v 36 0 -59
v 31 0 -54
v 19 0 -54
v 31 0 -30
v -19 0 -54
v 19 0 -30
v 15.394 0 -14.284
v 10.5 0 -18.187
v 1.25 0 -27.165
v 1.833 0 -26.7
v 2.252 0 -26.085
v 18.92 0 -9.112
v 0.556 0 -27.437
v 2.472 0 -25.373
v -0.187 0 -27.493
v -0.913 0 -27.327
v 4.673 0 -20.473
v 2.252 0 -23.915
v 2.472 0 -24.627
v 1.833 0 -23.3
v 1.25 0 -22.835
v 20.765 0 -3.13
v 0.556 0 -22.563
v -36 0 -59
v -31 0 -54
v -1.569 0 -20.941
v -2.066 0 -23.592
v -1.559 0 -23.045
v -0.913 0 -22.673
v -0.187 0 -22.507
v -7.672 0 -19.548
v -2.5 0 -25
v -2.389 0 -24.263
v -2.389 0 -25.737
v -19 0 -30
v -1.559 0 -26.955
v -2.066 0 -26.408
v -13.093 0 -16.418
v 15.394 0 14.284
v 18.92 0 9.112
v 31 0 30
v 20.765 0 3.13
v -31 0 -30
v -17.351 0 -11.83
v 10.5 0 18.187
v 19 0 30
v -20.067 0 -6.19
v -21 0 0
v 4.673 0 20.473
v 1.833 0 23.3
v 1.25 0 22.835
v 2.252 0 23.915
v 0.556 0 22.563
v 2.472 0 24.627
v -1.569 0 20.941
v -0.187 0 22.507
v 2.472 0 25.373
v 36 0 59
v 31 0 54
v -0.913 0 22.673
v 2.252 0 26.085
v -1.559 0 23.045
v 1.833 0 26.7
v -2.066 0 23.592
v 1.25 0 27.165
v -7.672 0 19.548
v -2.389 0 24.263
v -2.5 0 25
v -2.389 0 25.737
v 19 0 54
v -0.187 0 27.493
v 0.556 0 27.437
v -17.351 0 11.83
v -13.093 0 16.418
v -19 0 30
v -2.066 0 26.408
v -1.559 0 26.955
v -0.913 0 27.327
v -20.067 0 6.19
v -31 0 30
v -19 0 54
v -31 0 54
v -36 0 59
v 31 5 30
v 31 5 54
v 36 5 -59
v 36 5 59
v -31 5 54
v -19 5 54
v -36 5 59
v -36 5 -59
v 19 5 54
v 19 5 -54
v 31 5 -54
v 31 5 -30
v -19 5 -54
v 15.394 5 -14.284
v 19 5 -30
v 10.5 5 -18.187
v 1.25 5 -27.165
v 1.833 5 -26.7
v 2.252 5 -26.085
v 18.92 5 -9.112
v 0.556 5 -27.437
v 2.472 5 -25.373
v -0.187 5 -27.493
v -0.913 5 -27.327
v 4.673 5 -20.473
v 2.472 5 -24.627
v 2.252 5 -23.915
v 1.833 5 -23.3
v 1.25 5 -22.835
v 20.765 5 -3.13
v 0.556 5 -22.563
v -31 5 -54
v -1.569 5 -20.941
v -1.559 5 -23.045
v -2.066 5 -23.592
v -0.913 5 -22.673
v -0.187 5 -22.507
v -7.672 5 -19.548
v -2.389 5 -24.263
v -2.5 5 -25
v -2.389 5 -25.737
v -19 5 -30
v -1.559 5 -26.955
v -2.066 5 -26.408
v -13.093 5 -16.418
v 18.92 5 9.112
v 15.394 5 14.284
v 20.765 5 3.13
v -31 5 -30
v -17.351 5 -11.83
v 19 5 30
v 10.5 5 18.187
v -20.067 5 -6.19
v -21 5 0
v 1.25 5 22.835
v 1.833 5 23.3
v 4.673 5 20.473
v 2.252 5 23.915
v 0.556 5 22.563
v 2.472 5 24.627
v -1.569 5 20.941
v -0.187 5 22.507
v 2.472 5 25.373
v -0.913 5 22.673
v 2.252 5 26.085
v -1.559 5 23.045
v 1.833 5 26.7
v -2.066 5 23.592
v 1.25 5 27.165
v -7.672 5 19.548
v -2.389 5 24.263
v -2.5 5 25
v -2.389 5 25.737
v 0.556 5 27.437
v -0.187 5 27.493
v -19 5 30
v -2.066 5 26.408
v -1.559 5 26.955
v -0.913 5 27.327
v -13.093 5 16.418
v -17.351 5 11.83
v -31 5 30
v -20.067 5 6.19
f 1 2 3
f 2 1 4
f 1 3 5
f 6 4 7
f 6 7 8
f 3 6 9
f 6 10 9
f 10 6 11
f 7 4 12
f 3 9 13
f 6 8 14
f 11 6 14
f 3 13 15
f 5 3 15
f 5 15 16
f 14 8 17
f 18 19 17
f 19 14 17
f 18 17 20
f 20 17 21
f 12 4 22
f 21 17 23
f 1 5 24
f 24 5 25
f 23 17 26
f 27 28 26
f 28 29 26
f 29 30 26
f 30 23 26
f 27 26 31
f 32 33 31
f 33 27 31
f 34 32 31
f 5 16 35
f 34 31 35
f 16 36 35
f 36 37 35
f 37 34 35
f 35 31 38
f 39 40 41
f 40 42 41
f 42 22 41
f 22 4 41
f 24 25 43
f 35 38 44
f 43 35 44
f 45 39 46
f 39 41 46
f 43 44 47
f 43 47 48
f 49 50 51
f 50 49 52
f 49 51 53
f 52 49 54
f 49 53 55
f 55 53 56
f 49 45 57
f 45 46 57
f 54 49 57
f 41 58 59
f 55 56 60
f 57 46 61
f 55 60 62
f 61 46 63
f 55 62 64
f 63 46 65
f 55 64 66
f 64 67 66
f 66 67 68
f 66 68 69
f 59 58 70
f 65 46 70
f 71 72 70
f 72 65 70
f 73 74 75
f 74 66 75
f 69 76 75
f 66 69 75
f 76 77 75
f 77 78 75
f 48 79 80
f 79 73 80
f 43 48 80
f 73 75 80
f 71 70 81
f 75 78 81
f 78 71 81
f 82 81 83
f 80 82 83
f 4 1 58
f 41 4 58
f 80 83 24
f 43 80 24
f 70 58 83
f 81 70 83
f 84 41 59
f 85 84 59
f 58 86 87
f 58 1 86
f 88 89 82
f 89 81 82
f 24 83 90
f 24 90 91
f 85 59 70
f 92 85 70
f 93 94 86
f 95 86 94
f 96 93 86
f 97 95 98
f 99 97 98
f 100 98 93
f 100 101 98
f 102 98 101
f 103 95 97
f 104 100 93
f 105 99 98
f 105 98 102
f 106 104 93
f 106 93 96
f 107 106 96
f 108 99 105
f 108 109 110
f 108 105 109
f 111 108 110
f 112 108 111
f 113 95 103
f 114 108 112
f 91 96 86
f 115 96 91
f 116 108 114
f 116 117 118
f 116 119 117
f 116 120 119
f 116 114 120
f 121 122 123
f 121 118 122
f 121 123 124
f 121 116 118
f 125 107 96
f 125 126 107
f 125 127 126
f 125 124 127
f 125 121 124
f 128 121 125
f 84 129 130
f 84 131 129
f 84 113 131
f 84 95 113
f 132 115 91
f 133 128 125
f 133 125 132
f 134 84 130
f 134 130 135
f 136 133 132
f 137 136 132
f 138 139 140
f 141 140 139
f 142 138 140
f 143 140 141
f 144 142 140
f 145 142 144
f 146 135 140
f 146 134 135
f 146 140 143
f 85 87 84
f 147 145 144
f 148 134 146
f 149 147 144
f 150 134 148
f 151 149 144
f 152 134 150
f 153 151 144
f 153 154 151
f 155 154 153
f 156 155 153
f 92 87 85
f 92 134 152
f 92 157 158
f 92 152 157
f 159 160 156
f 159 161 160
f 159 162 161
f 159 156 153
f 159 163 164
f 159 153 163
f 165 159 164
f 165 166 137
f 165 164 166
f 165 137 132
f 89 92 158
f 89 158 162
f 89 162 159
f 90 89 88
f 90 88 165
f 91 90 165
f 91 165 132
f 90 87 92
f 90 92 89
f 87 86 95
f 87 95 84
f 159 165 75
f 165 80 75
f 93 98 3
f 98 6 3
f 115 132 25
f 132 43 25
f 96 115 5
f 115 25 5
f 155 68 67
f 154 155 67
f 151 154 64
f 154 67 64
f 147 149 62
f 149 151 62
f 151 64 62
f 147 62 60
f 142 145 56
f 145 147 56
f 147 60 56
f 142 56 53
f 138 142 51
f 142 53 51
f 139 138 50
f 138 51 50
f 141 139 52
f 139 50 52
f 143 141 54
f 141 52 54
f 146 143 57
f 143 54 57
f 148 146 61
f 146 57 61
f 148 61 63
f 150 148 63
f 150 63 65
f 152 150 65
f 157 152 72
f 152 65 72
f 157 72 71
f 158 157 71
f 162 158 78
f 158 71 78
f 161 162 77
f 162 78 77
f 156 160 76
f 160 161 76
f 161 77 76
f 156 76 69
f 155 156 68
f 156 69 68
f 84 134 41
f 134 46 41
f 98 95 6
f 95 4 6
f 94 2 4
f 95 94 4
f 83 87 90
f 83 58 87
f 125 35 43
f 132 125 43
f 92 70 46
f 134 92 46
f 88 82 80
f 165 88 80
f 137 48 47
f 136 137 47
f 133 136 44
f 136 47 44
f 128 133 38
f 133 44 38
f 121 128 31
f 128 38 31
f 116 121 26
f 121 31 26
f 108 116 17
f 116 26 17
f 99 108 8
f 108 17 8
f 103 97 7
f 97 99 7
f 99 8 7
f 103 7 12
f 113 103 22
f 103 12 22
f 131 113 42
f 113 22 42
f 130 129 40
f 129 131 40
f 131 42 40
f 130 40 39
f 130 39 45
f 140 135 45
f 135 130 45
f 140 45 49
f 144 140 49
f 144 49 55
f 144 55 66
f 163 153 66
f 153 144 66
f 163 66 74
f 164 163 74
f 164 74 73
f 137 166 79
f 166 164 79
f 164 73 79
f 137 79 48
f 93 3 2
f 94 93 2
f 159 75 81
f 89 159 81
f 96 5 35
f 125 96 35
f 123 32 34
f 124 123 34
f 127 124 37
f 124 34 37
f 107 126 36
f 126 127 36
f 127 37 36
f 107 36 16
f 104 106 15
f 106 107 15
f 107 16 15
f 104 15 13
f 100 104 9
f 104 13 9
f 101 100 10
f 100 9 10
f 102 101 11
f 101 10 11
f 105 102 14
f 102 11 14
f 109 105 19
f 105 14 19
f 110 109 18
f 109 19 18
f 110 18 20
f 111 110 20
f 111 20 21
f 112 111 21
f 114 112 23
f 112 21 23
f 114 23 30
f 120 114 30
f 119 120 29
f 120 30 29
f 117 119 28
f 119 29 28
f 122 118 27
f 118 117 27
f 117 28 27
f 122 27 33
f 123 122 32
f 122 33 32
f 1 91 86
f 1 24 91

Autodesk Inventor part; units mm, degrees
ref_plane "YZ Plane" through (0, 0, 0) normal (1, 0, 0) x (0, 1, 0)
ref_plane "XZ Plane" through (0, 0, 0) normal (0, 1, 0) x (-1, 0, 0)
ref_plane "XY Plane" through (0, 0, 0) normal (0, 0, 1) x (1, 0, 0)
sketch "Sketch1" plane through (0, 0, 0) normal (0, 1, 0) x (-1, 0, 0)
  circle A0 centre (0, 0) radius 21
  circle A1 centre (0, 25) radius 2.5
  circle A2 centre (0, -25) radius 2.5
  line L0 (-31, 54) -> (-19, 54)
  line L1 (-19, 54) -> (-19, 30)
  line L2 (-19, 30) -> (-31, 30)
  line L3 (-31, 30) -> (-31, 54)
  line L4 (19, 54) -> (31, 54)
  line L5 (31, 54) -> (31, 30)
  line L6 (31, 30) -> (19, 30)
  line L7 (19, 30) -> (19, 54)
  line L8 (-31, -30) -> (-19, -30)
  line L9 (-19, -30) -> (-19, -54)
  line L10 (-19, -54) -> (-31, -54)
  line L11 (-31, -54) -> (-31, -30)
  line L12 (19, -30) -> (31, -30)
  line L13 (31, -30) -> (31, -54)
  line L14 (31, -54) -> (19, -54)
  line L15 (19, -54) -> (19, -30)
  line L16 (-36, 59) -> (36, 59)
  line L17 (36, 59) -> (36, -59)
  line L18 (36, -59) -> (-36, -59)
  line L19 (-36, -59) -> (-36, 59)
  dimension "d2" = 5
  dimension "d4" = 5
  dimension "d9" = 12
  dimension "d10" = 24
  dimension "d11" = 12
  dimension "d12" = 24
  dimension "d13" = 12
  dimension "d14" = 24
  dimension "d15" = 12
  dimension "d16" = 24
extrude "Extrusion1" add sketch "Sketch1" along normal blind 5
properties part number "X_Carriage_V1" material "Ash"
